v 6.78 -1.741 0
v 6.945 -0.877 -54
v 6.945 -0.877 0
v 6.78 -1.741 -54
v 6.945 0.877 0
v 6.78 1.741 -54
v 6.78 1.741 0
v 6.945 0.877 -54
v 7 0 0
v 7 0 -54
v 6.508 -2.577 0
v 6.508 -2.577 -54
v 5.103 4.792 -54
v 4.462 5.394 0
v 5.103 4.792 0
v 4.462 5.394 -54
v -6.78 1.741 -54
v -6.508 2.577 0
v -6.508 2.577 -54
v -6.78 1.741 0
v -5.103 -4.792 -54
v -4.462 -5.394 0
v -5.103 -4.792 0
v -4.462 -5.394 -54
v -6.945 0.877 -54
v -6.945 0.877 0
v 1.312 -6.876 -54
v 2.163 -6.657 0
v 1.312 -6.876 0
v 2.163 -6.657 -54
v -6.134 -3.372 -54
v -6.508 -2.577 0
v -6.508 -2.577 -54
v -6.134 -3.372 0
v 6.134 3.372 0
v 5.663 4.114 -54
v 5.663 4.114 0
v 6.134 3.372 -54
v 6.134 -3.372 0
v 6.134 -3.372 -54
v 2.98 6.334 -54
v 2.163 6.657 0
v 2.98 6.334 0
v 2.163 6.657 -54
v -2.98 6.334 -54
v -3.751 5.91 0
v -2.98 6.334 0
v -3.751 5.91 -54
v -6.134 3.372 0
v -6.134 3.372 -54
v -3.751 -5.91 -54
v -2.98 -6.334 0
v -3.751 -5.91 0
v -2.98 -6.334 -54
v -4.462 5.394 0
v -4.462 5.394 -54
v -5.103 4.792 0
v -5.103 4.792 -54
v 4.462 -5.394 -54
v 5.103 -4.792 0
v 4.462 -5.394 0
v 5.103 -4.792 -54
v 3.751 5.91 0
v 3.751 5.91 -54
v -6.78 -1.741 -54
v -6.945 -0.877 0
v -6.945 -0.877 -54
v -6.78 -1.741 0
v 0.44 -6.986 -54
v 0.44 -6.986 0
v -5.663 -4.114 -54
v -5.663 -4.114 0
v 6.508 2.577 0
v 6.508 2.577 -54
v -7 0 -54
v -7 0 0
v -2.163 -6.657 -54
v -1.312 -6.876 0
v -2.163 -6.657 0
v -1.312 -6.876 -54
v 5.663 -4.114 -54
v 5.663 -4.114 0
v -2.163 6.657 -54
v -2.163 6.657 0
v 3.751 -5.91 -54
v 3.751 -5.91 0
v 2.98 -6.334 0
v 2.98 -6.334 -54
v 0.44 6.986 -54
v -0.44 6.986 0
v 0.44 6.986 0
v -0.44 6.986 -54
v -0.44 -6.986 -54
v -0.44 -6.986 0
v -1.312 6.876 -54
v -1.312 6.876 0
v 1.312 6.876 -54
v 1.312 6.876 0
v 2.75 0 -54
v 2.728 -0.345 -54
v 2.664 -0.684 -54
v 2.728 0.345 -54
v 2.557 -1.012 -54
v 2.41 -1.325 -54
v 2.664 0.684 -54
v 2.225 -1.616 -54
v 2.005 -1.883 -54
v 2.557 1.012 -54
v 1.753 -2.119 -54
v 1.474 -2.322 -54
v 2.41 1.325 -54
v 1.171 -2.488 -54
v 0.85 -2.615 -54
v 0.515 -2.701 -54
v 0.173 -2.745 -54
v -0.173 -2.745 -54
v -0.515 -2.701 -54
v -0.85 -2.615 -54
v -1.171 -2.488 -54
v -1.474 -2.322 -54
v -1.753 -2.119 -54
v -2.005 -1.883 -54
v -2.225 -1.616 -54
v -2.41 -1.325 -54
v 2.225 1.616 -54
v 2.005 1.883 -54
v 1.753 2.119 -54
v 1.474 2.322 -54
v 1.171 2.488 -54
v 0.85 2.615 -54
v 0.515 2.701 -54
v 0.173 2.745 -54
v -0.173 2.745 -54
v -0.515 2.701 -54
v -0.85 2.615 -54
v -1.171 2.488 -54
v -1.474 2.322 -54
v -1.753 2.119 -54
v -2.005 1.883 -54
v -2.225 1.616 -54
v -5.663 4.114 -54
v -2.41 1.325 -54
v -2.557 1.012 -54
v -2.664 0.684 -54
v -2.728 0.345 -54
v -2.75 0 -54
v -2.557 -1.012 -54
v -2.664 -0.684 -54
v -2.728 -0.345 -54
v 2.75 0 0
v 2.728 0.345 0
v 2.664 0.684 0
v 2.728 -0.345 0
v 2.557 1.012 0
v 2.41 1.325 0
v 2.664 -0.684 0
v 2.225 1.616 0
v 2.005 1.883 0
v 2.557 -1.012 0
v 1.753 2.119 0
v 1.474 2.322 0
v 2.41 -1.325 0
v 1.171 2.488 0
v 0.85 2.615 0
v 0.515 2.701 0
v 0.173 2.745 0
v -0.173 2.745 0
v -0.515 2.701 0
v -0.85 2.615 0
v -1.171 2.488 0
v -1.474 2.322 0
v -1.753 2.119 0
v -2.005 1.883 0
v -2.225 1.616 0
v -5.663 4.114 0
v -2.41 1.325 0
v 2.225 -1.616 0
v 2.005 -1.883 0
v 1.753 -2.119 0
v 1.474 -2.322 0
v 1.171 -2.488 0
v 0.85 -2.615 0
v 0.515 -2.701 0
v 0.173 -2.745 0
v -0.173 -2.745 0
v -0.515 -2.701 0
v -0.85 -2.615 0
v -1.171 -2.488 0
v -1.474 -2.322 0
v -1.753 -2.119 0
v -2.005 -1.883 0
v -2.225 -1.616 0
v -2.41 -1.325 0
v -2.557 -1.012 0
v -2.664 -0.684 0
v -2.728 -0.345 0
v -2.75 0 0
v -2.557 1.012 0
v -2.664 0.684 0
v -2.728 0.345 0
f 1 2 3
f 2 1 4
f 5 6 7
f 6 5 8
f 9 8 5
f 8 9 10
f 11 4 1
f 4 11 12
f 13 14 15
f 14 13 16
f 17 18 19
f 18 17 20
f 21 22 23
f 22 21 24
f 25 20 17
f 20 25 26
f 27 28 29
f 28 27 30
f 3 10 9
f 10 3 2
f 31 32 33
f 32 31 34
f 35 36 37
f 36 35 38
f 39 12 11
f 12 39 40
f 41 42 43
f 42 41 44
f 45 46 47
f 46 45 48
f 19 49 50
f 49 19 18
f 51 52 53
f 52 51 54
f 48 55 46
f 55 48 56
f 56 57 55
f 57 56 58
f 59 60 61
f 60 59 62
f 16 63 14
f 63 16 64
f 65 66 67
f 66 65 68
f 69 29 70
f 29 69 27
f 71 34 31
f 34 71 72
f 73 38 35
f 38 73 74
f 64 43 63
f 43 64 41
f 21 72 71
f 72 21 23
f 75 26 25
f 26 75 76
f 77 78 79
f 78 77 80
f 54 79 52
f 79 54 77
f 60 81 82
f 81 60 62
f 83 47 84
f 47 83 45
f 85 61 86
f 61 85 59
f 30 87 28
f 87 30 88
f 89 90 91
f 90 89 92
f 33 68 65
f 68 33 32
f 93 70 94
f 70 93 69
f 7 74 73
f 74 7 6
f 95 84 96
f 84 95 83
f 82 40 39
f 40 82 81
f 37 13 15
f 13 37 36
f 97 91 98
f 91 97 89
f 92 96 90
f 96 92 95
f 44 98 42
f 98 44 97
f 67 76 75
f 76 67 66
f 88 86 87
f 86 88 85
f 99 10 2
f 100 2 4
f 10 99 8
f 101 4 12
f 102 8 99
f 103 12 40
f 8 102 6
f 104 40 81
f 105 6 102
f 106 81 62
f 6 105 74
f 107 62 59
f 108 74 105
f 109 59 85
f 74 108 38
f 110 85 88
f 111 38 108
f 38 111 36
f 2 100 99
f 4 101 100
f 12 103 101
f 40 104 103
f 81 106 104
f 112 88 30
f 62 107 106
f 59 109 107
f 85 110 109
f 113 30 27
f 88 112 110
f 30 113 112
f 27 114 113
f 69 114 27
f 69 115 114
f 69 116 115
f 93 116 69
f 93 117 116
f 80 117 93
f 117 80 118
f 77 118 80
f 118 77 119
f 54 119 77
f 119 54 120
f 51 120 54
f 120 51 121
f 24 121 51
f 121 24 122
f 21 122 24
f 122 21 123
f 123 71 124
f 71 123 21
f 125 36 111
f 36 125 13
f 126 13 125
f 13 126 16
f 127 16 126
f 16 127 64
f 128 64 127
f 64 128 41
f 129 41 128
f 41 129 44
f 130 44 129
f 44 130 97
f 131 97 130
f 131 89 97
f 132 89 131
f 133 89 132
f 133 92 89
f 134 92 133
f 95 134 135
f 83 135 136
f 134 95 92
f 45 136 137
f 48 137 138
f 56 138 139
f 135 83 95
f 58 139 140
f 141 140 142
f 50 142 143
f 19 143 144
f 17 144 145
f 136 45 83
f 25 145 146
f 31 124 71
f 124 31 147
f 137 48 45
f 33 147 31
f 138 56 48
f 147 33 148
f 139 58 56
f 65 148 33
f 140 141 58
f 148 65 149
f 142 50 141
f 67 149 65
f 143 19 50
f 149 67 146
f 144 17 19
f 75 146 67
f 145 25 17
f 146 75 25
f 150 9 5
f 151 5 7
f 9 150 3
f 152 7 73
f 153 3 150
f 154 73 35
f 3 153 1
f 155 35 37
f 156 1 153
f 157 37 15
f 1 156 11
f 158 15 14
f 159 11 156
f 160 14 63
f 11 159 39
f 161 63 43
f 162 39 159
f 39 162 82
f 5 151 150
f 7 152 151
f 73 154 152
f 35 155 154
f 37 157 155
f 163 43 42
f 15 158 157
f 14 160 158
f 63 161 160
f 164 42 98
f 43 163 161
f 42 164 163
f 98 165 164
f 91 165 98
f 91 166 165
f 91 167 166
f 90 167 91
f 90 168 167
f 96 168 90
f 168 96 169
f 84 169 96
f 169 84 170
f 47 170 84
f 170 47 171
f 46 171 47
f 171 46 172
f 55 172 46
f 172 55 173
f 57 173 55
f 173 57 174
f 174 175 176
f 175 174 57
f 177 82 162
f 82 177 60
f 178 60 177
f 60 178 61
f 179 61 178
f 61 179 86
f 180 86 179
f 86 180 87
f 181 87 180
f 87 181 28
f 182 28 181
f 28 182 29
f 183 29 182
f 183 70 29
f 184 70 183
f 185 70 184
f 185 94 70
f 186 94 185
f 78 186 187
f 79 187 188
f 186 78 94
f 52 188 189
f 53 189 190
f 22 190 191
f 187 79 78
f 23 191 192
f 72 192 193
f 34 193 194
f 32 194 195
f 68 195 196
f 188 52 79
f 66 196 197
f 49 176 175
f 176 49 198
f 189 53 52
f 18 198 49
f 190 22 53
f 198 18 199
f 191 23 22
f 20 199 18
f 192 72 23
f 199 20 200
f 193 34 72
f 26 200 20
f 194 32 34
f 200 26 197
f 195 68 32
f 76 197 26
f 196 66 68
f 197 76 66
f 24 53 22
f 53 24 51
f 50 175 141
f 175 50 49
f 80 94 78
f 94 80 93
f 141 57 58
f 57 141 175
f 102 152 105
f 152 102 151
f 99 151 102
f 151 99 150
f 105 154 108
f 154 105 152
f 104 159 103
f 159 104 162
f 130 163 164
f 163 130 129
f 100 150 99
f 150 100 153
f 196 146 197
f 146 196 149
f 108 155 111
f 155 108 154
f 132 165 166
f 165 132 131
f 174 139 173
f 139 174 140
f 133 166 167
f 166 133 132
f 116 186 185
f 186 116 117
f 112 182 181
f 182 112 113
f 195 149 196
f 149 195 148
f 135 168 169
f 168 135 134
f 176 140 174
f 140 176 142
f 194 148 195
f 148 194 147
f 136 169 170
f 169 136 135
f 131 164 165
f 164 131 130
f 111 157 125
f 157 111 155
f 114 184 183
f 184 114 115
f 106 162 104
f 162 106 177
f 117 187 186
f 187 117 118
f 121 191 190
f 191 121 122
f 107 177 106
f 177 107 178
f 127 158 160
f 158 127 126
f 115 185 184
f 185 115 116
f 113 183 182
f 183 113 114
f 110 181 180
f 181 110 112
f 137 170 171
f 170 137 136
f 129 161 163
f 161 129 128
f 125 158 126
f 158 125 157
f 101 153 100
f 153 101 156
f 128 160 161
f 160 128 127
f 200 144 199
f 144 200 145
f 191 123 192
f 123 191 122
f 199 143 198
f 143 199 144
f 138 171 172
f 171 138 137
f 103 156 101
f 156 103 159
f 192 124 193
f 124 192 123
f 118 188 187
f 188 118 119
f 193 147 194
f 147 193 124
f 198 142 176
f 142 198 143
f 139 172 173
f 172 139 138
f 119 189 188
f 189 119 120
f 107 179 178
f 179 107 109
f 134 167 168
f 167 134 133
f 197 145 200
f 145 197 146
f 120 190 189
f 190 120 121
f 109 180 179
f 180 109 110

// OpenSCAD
$fn = 50;


difference() {
	union() {
		translate(v = [0, 0, -54.0000000000]) {
			cylinder(h = 54, r = 7.0000000000);
		}
		cylinder(h = 0, r = 16.0000000000);
	}
	union() {
		#translate(v = [0, 0, -54]) {
			cylinder(h = 54, r = 2.7500000000);
		}
	}
}
